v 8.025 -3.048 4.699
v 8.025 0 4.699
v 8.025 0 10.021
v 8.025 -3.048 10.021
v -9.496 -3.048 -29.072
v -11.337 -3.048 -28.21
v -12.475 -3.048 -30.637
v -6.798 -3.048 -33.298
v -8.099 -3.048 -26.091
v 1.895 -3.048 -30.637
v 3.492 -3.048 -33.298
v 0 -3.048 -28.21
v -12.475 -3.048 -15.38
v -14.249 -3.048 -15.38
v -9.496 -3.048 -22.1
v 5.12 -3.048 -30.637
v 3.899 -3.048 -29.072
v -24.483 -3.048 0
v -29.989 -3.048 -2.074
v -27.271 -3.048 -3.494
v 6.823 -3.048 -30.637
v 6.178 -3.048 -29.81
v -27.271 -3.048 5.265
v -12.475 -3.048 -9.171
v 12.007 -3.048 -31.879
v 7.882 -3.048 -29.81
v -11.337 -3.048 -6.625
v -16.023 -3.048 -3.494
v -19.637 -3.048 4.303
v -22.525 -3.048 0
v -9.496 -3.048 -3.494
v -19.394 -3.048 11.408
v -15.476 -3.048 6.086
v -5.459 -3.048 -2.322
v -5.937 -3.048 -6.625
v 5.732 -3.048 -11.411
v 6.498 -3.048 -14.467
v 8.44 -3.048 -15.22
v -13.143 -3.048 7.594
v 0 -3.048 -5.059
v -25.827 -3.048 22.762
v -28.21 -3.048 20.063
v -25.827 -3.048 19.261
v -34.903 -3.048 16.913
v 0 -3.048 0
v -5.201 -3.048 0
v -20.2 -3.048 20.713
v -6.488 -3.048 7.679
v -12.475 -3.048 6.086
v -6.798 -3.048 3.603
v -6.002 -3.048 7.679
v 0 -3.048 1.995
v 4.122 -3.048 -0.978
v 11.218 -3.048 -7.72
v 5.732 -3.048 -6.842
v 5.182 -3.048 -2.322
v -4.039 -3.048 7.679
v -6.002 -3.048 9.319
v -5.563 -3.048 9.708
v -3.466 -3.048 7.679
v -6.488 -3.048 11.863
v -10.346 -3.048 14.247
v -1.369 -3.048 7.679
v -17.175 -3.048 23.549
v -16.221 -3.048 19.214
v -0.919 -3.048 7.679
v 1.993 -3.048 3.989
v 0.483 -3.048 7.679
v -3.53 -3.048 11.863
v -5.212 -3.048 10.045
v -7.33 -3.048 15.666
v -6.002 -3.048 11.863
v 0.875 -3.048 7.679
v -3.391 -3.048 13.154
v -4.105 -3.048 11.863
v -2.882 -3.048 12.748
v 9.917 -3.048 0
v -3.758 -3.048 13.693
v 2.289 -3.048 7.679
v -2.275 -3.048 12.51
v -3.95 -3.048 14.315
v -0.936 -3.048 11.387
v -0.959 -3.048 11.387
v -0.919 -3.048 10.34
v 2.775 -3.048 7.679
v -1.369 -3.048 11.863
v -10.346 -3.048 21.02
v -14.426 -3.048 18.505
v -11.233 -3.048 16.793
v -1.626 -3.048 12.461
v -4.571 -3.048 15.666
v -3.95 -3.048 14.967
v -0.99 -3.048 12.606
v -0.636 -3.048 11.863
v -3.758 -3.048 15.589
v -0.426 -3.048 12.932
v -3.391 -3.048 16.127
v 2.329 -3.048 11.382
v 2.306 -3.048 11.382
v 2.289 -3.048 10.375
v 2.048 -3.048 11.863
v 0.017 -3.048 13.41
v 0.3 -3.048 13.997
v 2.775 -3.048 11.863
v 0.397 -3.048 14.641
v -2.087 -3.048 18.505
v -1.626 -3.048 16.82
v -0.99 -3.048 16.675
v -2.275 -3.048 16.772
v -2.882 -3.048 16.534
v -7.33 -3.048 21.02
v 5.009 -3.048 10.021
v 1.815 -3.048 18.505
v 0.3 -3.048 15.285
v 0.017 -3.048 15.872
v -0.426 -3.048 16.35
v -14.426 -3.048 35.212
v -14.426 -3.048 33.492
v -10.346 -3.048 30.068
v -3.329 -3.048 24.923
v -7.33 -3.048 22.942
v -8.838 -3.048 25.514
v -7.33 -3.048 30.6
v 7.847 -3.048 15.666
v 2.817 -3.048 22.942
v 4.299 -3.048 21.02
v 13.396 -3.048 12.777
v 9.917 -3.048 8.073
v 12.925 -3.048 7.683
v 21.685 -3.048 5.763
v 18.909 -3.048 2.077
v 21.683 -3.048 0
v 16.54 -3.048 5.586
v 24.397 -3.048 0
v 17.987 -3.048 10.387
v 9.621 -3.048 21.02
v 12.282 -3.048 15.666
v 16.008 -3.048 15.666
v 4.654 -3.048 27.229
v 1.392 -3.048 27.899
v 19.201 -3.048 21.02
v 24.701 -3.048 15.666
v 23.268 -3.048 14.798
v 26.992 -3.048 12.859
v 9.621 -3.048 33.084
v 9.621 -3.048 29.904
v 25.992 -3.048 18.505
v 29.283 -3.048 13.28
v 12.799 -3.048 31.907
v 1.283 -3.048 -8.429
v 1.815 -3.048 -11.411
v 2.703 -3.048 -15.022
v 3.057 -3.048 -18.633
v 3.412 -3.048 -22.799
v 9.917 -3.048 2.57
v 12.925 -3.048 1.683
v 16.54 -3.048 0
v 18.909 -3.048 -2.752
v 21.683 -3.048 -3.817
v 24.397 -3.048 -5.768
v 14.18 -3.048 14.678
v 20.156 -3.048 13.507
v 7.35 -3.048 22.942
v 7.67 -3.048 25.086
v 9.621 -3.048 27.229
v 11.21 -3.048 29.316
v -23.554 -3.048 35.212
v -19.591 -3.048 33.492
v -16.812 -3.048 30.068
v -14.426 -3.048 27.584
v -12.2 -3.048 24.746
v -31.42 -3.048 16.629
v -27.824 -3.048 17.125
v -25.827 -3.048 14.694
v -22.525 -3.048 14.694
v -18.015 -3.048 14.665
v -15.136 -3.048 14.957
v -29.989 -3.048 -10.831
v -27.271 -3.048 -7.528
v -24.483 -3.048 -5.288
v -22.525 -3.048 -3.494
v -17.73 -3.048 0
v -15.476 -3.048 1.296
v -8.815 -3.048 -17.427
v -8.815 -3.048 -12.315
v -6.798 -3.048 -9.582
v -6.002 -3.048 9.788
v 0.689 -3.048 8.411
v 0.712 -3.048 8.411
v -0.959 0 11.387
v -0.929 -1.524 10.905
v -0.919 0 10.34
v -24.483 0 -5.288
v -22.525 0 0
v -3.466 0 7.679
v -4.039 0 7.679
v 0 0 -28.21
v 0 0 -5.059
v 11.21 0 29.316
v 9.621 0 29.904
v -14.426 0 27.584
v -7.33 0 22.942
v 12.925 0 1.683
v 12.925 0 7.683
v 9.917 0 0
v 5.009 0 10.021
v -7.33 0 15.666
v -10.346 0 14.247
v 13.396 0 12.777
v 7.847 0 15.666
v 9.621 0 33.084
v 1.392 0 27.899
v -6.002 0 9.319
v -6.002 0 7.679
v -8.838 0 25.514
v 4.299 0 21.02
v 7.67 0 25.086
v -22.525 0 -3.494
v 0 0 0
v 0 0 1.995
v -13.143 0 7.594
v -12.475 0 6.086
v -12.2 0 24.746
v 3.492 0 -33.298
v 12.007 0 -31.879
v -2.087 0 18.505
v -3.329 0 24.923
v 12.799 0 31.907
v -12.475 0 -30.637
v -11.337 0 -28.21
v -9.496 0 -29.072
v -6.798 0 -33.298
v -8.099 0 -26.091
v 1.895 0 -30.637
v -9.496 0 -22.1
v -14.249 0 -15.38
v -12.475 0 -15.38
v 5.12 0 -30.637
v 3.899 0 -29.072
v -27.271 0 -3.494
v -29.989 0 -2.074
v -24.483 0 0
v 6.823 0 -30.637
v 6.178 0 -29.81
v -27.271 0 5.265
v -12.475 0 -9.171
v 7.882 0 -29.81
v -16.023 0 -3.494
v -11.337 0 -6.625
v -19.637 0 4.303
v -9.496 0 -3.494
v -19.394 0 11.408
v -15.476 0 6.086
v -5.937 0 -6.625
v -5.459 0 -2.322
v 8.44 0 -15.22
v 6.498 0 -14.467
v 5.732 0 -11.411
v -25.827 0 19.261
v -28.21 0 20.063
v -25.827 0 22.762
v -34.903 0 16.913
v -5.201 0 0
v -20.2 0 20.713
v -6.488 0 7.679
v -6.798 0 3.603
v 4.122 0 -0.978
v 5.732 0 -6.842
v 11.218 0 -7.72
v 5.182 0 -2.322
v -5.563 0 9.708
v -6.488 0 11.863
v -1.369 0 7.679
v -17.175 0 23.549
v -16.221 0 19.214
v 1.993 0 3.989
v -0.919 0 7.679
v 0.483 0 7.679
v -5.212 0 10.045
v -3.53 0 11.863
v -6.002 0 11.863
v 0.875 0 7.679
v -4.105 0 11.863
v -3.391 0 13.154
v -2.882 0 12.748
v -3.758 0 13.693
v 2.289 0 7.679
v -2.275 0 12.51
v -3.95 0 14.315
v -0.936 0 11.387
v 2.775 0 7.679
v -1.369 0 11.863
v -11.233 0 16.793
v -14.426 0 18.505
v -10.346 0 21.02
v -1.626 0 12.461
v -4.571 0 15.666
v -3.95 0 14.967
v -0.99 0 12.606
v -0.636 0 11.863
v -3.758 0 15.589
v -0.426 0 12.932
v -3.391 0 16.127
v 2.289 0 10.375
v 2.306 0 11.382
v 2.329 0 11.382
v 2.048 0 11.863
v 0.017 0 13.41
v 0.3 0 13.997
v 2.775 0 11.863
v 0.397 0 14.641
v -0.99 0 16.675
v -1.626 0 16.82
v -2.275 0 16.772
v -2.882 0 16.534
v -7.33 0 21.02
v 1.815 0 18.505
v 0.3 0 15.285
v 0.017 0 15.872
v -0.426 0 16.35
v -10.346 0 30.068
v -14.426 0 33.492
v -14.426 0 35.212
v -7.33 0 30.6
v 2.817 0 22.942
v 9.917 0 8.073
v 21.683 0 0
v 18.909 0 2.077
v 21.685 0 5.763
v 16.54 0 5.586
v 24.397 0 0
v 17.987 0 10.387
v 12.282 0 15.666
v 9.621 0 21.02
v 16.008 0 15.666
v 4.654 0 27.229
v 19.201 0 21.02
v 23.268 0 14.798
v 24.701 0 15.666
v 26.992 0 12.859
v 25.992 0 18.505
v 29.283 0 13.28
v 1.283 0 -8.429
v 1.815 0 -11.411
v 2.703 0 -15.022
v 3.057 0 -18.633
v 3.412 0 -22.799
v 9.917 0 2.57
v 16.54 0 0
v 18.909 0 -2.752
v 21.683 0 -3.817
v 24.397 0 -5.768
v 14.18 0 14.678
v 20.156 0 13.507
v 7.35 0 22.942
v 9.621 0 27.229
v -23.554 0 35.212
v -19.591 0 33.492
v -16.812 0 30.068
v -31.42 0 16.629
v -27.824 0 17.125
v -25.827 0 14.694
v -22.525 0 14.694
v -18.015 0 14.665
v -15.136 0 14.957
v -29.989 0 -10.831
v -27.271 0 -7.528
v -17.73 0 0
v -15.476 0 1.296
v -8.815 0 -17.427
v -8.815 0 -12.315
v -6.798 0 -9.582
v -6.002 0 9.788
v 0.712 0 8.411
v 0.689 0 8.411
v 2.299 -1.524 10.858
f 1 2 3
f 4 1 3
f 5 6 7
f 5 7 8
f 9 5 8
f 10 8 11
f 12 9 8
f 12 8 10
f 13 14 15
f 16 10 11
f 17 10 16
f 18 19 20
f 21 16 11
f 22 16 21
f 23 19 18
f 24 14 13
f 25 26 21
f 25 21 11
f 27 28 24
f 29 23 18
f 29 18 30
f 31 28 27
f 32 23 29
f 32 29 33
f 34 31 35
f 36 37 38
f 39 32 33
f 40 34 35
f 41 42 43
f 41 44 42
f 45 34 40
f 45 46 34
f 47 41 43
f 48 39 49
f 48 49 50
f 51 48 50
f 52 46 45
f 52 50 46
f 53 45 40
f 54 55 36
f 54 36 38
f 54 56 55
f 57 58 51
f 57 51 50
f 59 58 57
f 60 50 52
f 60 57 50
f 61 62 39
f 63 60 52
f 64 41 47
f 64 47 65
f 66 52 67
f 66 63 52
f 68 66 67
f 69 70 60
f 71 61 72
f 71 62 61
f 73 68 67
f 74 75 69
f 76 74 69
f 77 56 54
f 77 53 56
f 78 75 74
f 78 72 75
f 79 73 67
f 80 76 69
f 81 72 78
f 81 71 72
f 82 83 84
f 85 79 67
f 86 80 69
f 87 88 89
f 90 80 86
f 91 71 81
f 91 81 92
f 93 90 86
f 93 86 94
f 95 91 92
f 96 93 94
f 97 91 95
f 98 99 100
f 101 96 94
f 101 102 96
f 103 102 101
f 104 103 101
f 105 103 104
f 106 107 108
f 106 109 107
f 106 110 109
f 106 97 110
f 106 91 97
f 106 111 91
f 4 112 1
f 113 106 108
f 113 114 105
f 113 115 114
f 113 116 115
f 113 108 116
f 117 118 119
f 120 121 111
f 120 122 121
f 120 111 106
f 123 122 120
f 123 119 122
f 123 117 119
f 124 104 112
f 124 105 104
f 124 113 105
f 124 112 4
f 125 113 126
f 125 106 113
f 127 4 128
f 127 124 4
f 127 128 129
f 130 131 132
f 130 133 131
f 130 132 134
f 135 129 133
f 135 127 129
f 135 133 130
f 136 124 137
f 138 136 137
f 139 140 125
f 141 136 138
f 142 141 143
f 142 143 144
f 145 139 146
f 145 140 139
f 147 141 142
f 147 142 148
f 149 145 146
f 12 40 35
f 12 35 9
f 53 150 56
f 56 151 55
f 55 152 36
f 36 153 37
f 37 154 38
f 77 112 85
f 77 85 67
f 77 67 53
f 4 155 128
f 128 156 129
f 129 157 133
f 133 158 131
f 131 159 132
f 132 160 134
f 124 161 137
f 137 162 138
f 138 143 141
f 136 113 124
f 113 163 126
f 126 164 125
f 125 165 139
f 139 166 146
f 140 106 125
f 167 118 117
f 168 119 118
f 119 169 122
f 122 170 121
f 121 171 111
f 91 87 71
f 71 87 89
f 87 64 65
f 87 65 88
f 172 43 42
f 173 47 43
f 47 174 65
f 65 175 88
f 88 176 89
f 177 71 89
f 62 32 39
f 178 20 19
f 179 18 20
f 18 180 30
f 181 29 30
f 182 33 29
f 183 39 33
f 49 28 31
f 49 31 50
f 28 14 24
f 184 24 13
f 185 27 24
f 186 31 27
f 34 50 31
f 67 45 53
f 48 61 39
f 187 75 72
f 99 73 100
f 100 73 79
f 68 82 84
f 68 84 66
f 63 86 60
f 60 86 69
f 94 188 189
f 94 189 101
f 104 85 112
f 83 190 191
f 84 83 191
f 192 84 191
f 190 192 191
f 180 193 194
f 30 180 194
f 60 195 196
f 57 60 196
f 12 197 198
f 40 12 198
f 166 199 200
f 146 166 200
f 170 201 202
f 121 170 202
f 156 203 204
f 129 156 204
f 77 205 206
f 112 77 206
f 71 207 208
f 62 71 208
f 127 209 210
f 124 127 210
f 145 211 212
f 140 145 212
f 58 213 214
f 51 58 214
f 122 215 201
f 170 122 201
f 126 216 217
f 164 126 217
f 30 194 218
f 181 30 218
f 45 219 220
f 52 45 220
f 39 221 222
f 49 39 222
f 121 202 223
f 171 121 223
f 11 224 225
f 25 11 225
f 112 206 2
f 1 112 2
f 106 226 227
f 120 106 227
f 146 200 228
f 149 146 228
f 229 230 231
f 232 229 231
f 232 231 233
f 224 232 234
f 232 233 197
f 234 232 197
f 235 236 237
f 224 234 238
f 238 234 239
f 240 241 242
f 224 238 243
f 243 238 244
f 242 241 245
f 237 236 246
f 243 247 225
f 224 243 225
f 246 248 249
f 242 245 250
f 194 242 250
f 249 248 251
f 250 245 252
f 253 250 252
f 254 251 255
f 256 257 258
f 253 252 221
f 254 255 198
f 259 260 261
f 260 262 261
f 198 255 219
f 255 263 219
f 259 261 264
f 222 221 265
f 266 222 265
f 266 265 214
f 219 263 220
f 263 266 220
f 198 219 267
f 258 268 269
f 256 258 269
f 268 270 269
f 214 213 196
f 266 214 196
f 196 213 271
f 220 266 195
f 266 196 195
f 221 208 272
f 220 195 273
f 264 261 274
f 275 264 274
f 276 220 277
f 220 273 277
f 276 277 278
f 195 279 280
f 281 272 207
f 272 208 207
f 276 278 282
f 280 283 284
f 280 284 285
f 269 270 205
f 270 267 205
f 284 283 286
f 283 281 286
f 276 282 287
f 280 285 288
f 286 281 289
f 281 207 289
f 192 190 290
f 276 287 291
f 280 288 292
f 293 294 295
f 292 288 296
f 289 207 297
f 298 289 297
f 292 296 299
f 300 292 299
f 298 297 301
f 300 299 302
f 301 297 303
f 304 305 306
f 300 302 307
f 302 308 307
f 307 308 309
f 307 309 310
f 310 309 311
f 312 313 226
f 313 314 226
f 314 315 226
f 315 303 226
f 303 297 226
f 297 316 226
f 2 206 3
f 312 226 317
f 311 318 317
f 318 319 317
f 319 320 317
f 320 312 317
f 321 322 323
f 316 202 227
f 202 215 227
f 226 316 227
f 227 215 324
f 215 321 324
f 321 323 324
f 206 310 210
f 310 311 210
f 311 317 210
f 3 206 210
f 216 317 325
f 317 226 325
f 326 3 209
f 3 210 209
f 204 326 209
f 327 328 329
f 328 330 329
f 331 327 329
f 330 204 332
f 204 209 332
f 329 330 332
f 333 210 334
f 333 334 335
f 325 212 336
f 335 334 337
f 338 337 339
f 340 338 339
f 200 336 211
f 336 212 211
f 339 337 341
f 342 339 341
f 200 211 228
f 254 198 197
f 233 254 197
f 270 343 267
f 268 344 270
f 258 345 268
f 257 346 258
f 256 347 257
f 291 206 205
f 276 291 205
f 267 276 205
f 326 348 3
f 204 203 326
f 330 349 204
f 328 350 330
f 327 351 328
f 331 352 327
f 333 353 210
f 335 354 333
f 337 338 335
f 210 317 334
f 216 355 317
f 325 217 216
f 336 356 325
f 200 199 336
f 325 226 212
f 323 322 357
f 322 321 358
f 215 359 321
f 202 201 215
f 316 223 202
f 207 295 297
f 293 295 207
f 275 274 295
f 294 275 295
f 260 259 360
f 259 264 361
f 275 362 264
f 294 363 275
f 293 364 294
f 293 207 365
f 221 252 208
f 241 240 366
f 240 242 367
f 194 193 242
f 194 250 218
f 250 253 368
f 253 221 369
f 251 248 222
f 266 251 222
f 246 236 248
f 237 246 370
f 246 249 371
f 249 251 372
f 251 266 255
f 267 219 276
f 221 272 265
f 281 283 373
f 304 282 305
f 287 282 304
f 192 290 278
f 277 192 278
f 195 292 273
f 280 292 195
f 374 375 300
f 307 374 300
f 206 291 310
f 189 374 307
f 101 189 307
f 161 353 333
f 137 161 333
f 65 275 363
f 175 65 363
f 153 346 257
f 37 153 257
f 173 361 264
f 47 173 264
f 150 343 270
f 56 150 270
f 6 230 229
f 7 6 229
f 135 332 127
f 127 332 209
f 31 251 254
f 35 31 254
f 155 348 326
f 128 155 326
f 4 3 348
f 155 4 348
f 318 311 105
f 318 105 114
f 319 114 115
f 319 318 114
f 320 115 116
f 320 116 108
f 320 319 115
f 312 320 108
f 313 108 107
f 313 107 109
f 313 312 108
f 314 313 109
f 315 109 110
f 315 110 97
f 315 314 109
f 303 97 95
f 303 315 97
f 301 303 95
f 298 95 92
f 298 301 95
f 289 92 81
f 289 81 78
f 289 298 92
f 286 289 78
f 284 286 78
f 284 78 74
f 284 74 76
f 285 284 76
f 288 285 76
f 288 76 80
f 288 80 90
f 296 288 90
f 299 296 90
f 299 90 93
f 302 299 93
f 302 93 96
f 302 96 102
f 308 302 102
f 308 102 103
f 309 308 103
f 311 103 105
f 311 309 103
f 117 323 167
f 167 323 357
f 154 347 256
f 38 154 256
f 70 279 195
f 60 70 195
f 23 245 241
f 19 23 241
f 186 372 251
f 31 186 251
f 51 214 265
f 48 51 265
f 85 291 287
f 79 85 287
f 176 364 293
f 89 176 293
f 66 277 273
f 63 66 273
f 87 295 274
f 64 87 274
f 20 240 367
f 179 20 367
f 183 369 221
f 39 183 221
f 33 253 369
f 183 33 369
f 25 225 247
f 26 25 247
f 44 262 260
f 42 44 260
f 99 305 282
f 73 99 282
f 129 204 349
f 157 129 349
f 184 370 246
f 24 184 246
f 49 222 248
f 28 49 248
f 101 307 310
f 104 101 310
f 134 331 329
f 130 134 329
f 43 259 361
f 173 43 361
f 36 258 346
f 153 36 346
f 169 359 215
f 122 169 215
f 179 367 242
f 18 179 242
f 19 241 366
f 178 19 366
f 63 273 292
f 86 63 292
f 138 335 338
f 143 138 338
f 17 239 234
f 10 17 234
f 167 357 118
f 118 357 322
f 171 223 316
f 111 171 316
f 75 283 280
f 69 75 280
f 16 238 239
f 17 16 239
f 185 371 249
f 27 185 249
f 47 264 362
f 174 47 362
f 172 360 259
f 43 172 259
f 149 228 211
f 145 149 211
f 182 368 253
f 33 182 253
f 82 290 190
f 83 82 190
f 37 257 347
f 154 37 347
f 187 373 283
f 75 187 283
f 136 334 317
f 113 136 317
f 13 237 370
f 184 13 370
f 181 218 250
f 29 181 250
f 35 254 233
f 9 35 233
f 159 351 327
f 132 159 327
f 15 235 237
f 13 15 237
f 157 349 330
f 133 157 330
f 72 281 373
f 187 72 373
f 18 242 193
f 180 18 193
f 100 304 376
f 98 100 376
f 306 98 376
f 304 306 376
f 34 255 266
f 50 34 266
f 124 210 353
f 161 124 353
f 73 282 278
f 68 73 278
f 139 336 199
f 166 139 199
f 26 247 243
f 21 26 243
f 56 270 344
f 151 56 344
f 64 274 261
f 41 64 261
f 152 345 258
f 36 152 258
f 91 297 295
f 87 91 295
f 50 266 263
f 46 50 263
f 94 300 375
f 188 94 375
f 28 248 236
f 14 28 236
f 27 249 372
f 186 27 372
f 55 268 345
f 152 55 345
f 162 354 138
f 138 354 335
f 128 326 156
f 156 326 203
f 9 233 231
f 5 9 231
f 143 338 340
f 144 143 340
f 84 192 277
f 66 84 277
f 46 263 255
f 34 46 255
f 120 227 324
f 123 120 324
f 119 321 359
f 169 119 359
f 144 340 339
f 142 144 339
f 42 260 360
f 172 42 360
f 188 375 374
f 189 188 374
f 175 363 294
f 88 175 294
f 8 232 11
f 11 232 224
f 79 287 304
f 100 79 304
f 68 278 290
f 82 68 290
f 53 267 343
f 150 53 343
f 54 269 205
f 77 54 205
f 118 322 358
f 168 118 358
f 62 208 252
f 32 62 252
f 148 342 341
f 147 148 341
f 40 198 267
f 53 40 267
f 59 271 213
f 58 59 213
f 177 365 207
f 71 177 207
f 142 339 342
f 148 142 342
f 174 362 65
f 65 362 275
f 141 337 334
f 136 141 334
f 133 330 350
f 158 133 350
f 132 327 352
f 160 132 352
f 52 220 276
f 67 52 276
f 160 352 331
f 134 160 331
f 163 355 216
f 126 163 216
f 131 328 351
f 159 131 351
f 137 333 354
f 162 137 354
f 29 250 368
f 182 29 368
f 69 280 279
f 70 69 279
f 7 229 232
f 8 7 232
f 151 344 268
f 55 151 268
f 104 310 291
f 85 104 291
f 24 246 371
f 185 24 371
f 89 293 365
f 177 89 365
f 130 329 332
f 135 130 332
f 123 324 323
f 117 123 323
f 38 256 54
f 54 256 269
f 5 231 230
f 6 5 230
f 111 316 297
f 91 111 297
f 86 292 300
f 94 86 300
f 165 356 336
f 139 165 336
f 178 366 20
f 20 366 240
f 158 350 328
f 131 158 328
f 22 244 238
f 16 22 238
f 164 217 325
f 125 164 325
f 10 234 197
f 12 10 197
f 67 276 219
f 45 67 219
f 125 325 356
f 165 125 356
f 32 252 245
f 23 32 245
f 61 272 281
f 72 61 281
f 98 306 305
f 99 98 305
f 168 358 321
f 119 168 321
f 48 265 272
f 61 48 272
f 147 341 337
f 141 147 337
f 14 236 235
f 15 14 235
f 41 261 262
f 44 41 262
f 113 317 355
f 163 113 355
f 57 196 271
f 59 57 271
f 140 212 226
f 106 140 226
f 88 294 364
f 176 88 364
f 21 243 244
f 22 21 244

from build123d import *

# Parameters (mm, degrees)
F0_R     = 2.1855866809
F1_DEPTH = 3.048


with BuildPart() as f1:
    # F0 (on Front) → F1 (new body)
    with BuildSketch(Plane.XZ):
        Polygon((-5.9369264533, -6.6248892115), (-8.0986570849, -26.090829358), (-8.0986570849, -29.0724959499), (-6.7978715524, -28.209612886), (-3.9593786933, -29.0724959499), (0, -28.209612886), (0, -5.0586252473), (4.1217724793, -0.9782924317), (1.2832815992, -8.4293344989), (5.1818756491, -2.3217138641), (1.8154965946, -11.4109388133), (5.7322757336, -6.8417807078), (2.702526981, -15.0221036917), (5.7322757336, -11.4109388133), (3.0573392287, -18.6332685701), (6.4980270698, -14.4673358305), (3.4121514764, -22.7992013097), (8.4402870655, -15.2195461217), (11.2180029973, -7.7197118662), (9.9174999541, 0), (5.0088027492, 10.0208651274), (8.024699986, 4.6986923553), (8.024699986, 10.0208651274), (9.9174999541, 2.5698228274), (9.9174999541, 8.0731014378), (12.9247023214, 1.6827941872), (12.9247023214, 7.682890673), (16.5401790291, 0), (16.5401790291, 5.5857207626), (18.9088093805, -2.7523501776), (18.9088093805, 2.0773874768), (21.6825364495, -3.8167845923), (21.6825364495, 0), (24.3970053162, -5.7682483457), (24.3970053162, 0), (21.6849464923, 5.7631270029), (17.9872654723, 10.3869775868), (13.3964173922, 12.7771075341), (7.8472970054, 15.6661421061), (14.1803448269, 14.6780370192), (12.2824395075, 15.6661421061), (20.1555828001, 13.5067671671), (16.00795798, 15.6661421061), (23.2676268034, 14.7984231008), (26.9920900816, 12.8593584523), (24.7008390725, 15.6661421061), (29.2833410908, 13.2803573629), (25.9918076559, 18.5046344995), (19.2012600601, 21.019651712), (14.9435270578, 21.019651712), (9.621351026, 21.019651712), (1.8154965946, 18.5046344995), (7.3503633432, 22.9420375162), (4.2991787195, 21.019651712), (7.6698875055, 25.0856313896), (2.8167848962, 22.9420375162), (9.621351026, 27.229225263), (4.6539907344, 27.229225263), (11.2102990657, 29.3158966176), (9.621351026, 29.9043957943), (12.7992471054, 31.9066156085), (9.621351026, 33.0836139619), (1.3918339066, 27.8986419471), (-2.087427536, 18.5046344995), (-3.3292702865, 24.9229501933), (-7.3300888762, 30.5999331176), (-14.4263189286, 35.2124832571), (-23.553526029, 35.2124832571), (-14.4263189286, 33.4919277449), (-19.5913599088, 33.4919277449), (-10.345986113, 30.0677157938), (-16.8121065944, 30.0677157938), (-8.8380374946, 25.5143014271), (-14.4263189286, 27.5840349495), (-7.3300888762, 22.9420375162), (-12.1995583177, 24.7455444187), (-7.3300888762, 21.019651712), (-4.5711095445, 15.6661421061), (-10.345986113, 21.019651712), (-17.1750385652, 23.54892998), (-25.8271690029, 22.7623730898), (-34.9033385476, 16.912889007), (-28.2102105994, 20.0625951825), (-31.419938263, 16.6290679), (-25.8271690029, 19.2609584022), (-27.8235962899, 17.1253293783), (-20.200404818, 20.7127123541), (-25.8271690029, 14.6936196567), (-16.2208060825, 19.2142594606), (-22.524728283, 14.6936196567), (-14.4263189286, 18.5046344995), (-18.0152932364, 14.6654174403), (-11.2330154516, 16.7931901649), (-15.135942027, 14.9565194733), (-7.3300888762, 15.6661421061), (-10.345986113, 14.2468968406), (-19.3936806172, 11.4084053785), (-27.2707313308, 5.2649948951), (-29.9890381223, -2.0744346548), (-29.9890381223, -10.8314546173), (-27.2713444978, -3.4936806187), (-27.2713444978, -7.5277050313), (-24.4833060582, 0), (-24.4833060582, -5.2881608668), (-22.524728283, 0), (-22.524728283, -3.4936806187), (-19.6370323027, 4.3030998167), (-17.7298966168, 0), (-15.4757376271, 6.086230278), (-15.4757376271, 1.2962748297), (-13.1431804335, 7.5941802934), (-12.4748563394, 6.086230278), (-16.0229708999, -3.4936806187), (-14.248913154, -15.3798665851), (-9.4963132998, -22.1003994255), (-12.4748563394, -15.3798665851), (-8.8154319776, -17.4274813299), (-12.4748563394, -9.1706654057), (-8.8154319776, -12.3146366909), (-11.3371305027, -6.6248892115), (-6.7978715524, -9.5822165707), (-9.4963132998, -3.4936806187), align=None)
        Polygon((-5.4590504354, -2.3217138641), (-5.9369264533, -6.6248892115), (-8.0986570849, 0), align=None, mode=Mode.SUBTRACT)
        Polygon((-5.2012195811, 0), (-5.4590504354, -2.3217138641), (-6.7978715524, 3.6025505979), align=None, mode=Mode.SUBTRACT)
        Polygon((4.1217724793, 2.9246343765), (0, -5.0586252473), (0, 0), align=None, mode=Mode.SUBTRACT)
        Polygon((-5.2116346857, 10.044903243), (-3.4663525091, 7.6787914149), (-4.0386512292, 7.6787914149), (-5.5632550193, 9.7079337566), (-6.0018647583, 9.318770627), (-6.0018647583, 7.6787914149), (-6.4880897508, 7.6787914149), (-6.4880897508, 11.8625239778), (-6.0018647583, 11.8625239778), (-6.0018647583, 9.7875977385), (-4.1045800417, 11.8625239778), (-3.5295342878, 11.8625239778), align=None, mode=Mode.SUBTRACT)
        Polygon((1.9929027185, 3.9890692569), (0, 0), (0, 1.9945346285), align=None, mode=Mode.SUBTRACT)
        with BuildLine():
            Line((0.8748766614, 7.6787914149), (0.482966498, 7.6787914149))
            Line((0.482966498, 7.6787914149), (-0.9363343277, 11.3872871207))
            Line((-0.9363343277, 11.3872871207), (-0.9592262765, 11.3872871207))
            add(Edge.make_bspline(
                [(-0.9592262765, 11.3872871207), (-0.9189364466, 10.9468460257), (-0.9189364466, 10.3397515435)],
                knots=[0, 0, 0, 1, 1, 1], degree=2))
            Line((-0.9189364466, 10.3397515435), (-0.9189364466, 7.6787914149))
            Line((-0.9189364466, 7.6787914149), (-1.368534321, 7.6787914149))
            Line((-1.368534321, 7.6787914149), (-1.368534321, 11.8625239778))
            Line((-1.368534321, 11.8625239778), (-0.6359919594, 11.8625239778))
            Line((-0.6359919594, 11.8625239778), (0.6889940372, 8.4113337766))
            Line((0.6889940372, 8.4113337766), (0.711885986, 8.4113337766))
            Line((0.711885986, 8.4113337766), (2.047860118, 11.8625239778))
            Line((2.047860118, 11.8625239778), (2.7749084119, 11.8625239778))
            Line((2.7749084119, 11.8625239778), (2.7749084119, 7.6787914149))
            Line((2.7749084119, 7.6787914149), (2.2886834194, 7.6787914149))
            Line((2.2886834194, 7.6787914149), (2.2886834194, 10.3745473057))
            add(Edge.make_bspline(
                [(2.2886834194, 10.3745473057), (2.2886834194, 10.8378803495), (2.3289732493, 11.381793053)],
                knots=[0, 0, 0, 1, 1, 1], degree=2))
            Line((2.3289732493, 11.381793053), (2.3060813005, 11.381793053))
            Line((2.3060813005, 11.381793053), (0.8748766614, 7.6787914149))
        make_face(mode=Mode.SUBTRACT)
        with Locations((-1.788830501, 14.6408742294)):
            Circle(F0_R, mode=Mode.SUBTRACT)
        Polygon((3.4916638397, -33.2978479564), (12.0071414858, -31.8786017597), (7.881906937, -29.8103850529), (6.8234760188, -30.6367613375), (6.1782777805, -29.8103850529), (5.1198468623, -30.6367613375), (3.8985372832, -29.0724959499), (1.8950107042, -30.6367613375), (0, -28.209612886), (-3.9593786933, -29.0724959499), (-6.7978715524, -28.209612886), (-8.0986570849, -29.0724959499), (-8.0986570849, -26.090829358), (-9.4963132998, -29.0724959499), (-11.3371305027, -28.209612886), (-12.4748563394, -30.6367613375), (-6.7978715524, -33.2978479564), align=None)
        Polygon((0, 0), (0, -5.0586252473), (4.1217724793, 2.9246343765), align=None)
        Polygon((-8.0986570849, 0), (-5.9369264533, -6.6248892115), (-5.4590504354, -2.3217138641), align=None)
    extrude(amount=F1_DEPTH)


solid = f1.part
